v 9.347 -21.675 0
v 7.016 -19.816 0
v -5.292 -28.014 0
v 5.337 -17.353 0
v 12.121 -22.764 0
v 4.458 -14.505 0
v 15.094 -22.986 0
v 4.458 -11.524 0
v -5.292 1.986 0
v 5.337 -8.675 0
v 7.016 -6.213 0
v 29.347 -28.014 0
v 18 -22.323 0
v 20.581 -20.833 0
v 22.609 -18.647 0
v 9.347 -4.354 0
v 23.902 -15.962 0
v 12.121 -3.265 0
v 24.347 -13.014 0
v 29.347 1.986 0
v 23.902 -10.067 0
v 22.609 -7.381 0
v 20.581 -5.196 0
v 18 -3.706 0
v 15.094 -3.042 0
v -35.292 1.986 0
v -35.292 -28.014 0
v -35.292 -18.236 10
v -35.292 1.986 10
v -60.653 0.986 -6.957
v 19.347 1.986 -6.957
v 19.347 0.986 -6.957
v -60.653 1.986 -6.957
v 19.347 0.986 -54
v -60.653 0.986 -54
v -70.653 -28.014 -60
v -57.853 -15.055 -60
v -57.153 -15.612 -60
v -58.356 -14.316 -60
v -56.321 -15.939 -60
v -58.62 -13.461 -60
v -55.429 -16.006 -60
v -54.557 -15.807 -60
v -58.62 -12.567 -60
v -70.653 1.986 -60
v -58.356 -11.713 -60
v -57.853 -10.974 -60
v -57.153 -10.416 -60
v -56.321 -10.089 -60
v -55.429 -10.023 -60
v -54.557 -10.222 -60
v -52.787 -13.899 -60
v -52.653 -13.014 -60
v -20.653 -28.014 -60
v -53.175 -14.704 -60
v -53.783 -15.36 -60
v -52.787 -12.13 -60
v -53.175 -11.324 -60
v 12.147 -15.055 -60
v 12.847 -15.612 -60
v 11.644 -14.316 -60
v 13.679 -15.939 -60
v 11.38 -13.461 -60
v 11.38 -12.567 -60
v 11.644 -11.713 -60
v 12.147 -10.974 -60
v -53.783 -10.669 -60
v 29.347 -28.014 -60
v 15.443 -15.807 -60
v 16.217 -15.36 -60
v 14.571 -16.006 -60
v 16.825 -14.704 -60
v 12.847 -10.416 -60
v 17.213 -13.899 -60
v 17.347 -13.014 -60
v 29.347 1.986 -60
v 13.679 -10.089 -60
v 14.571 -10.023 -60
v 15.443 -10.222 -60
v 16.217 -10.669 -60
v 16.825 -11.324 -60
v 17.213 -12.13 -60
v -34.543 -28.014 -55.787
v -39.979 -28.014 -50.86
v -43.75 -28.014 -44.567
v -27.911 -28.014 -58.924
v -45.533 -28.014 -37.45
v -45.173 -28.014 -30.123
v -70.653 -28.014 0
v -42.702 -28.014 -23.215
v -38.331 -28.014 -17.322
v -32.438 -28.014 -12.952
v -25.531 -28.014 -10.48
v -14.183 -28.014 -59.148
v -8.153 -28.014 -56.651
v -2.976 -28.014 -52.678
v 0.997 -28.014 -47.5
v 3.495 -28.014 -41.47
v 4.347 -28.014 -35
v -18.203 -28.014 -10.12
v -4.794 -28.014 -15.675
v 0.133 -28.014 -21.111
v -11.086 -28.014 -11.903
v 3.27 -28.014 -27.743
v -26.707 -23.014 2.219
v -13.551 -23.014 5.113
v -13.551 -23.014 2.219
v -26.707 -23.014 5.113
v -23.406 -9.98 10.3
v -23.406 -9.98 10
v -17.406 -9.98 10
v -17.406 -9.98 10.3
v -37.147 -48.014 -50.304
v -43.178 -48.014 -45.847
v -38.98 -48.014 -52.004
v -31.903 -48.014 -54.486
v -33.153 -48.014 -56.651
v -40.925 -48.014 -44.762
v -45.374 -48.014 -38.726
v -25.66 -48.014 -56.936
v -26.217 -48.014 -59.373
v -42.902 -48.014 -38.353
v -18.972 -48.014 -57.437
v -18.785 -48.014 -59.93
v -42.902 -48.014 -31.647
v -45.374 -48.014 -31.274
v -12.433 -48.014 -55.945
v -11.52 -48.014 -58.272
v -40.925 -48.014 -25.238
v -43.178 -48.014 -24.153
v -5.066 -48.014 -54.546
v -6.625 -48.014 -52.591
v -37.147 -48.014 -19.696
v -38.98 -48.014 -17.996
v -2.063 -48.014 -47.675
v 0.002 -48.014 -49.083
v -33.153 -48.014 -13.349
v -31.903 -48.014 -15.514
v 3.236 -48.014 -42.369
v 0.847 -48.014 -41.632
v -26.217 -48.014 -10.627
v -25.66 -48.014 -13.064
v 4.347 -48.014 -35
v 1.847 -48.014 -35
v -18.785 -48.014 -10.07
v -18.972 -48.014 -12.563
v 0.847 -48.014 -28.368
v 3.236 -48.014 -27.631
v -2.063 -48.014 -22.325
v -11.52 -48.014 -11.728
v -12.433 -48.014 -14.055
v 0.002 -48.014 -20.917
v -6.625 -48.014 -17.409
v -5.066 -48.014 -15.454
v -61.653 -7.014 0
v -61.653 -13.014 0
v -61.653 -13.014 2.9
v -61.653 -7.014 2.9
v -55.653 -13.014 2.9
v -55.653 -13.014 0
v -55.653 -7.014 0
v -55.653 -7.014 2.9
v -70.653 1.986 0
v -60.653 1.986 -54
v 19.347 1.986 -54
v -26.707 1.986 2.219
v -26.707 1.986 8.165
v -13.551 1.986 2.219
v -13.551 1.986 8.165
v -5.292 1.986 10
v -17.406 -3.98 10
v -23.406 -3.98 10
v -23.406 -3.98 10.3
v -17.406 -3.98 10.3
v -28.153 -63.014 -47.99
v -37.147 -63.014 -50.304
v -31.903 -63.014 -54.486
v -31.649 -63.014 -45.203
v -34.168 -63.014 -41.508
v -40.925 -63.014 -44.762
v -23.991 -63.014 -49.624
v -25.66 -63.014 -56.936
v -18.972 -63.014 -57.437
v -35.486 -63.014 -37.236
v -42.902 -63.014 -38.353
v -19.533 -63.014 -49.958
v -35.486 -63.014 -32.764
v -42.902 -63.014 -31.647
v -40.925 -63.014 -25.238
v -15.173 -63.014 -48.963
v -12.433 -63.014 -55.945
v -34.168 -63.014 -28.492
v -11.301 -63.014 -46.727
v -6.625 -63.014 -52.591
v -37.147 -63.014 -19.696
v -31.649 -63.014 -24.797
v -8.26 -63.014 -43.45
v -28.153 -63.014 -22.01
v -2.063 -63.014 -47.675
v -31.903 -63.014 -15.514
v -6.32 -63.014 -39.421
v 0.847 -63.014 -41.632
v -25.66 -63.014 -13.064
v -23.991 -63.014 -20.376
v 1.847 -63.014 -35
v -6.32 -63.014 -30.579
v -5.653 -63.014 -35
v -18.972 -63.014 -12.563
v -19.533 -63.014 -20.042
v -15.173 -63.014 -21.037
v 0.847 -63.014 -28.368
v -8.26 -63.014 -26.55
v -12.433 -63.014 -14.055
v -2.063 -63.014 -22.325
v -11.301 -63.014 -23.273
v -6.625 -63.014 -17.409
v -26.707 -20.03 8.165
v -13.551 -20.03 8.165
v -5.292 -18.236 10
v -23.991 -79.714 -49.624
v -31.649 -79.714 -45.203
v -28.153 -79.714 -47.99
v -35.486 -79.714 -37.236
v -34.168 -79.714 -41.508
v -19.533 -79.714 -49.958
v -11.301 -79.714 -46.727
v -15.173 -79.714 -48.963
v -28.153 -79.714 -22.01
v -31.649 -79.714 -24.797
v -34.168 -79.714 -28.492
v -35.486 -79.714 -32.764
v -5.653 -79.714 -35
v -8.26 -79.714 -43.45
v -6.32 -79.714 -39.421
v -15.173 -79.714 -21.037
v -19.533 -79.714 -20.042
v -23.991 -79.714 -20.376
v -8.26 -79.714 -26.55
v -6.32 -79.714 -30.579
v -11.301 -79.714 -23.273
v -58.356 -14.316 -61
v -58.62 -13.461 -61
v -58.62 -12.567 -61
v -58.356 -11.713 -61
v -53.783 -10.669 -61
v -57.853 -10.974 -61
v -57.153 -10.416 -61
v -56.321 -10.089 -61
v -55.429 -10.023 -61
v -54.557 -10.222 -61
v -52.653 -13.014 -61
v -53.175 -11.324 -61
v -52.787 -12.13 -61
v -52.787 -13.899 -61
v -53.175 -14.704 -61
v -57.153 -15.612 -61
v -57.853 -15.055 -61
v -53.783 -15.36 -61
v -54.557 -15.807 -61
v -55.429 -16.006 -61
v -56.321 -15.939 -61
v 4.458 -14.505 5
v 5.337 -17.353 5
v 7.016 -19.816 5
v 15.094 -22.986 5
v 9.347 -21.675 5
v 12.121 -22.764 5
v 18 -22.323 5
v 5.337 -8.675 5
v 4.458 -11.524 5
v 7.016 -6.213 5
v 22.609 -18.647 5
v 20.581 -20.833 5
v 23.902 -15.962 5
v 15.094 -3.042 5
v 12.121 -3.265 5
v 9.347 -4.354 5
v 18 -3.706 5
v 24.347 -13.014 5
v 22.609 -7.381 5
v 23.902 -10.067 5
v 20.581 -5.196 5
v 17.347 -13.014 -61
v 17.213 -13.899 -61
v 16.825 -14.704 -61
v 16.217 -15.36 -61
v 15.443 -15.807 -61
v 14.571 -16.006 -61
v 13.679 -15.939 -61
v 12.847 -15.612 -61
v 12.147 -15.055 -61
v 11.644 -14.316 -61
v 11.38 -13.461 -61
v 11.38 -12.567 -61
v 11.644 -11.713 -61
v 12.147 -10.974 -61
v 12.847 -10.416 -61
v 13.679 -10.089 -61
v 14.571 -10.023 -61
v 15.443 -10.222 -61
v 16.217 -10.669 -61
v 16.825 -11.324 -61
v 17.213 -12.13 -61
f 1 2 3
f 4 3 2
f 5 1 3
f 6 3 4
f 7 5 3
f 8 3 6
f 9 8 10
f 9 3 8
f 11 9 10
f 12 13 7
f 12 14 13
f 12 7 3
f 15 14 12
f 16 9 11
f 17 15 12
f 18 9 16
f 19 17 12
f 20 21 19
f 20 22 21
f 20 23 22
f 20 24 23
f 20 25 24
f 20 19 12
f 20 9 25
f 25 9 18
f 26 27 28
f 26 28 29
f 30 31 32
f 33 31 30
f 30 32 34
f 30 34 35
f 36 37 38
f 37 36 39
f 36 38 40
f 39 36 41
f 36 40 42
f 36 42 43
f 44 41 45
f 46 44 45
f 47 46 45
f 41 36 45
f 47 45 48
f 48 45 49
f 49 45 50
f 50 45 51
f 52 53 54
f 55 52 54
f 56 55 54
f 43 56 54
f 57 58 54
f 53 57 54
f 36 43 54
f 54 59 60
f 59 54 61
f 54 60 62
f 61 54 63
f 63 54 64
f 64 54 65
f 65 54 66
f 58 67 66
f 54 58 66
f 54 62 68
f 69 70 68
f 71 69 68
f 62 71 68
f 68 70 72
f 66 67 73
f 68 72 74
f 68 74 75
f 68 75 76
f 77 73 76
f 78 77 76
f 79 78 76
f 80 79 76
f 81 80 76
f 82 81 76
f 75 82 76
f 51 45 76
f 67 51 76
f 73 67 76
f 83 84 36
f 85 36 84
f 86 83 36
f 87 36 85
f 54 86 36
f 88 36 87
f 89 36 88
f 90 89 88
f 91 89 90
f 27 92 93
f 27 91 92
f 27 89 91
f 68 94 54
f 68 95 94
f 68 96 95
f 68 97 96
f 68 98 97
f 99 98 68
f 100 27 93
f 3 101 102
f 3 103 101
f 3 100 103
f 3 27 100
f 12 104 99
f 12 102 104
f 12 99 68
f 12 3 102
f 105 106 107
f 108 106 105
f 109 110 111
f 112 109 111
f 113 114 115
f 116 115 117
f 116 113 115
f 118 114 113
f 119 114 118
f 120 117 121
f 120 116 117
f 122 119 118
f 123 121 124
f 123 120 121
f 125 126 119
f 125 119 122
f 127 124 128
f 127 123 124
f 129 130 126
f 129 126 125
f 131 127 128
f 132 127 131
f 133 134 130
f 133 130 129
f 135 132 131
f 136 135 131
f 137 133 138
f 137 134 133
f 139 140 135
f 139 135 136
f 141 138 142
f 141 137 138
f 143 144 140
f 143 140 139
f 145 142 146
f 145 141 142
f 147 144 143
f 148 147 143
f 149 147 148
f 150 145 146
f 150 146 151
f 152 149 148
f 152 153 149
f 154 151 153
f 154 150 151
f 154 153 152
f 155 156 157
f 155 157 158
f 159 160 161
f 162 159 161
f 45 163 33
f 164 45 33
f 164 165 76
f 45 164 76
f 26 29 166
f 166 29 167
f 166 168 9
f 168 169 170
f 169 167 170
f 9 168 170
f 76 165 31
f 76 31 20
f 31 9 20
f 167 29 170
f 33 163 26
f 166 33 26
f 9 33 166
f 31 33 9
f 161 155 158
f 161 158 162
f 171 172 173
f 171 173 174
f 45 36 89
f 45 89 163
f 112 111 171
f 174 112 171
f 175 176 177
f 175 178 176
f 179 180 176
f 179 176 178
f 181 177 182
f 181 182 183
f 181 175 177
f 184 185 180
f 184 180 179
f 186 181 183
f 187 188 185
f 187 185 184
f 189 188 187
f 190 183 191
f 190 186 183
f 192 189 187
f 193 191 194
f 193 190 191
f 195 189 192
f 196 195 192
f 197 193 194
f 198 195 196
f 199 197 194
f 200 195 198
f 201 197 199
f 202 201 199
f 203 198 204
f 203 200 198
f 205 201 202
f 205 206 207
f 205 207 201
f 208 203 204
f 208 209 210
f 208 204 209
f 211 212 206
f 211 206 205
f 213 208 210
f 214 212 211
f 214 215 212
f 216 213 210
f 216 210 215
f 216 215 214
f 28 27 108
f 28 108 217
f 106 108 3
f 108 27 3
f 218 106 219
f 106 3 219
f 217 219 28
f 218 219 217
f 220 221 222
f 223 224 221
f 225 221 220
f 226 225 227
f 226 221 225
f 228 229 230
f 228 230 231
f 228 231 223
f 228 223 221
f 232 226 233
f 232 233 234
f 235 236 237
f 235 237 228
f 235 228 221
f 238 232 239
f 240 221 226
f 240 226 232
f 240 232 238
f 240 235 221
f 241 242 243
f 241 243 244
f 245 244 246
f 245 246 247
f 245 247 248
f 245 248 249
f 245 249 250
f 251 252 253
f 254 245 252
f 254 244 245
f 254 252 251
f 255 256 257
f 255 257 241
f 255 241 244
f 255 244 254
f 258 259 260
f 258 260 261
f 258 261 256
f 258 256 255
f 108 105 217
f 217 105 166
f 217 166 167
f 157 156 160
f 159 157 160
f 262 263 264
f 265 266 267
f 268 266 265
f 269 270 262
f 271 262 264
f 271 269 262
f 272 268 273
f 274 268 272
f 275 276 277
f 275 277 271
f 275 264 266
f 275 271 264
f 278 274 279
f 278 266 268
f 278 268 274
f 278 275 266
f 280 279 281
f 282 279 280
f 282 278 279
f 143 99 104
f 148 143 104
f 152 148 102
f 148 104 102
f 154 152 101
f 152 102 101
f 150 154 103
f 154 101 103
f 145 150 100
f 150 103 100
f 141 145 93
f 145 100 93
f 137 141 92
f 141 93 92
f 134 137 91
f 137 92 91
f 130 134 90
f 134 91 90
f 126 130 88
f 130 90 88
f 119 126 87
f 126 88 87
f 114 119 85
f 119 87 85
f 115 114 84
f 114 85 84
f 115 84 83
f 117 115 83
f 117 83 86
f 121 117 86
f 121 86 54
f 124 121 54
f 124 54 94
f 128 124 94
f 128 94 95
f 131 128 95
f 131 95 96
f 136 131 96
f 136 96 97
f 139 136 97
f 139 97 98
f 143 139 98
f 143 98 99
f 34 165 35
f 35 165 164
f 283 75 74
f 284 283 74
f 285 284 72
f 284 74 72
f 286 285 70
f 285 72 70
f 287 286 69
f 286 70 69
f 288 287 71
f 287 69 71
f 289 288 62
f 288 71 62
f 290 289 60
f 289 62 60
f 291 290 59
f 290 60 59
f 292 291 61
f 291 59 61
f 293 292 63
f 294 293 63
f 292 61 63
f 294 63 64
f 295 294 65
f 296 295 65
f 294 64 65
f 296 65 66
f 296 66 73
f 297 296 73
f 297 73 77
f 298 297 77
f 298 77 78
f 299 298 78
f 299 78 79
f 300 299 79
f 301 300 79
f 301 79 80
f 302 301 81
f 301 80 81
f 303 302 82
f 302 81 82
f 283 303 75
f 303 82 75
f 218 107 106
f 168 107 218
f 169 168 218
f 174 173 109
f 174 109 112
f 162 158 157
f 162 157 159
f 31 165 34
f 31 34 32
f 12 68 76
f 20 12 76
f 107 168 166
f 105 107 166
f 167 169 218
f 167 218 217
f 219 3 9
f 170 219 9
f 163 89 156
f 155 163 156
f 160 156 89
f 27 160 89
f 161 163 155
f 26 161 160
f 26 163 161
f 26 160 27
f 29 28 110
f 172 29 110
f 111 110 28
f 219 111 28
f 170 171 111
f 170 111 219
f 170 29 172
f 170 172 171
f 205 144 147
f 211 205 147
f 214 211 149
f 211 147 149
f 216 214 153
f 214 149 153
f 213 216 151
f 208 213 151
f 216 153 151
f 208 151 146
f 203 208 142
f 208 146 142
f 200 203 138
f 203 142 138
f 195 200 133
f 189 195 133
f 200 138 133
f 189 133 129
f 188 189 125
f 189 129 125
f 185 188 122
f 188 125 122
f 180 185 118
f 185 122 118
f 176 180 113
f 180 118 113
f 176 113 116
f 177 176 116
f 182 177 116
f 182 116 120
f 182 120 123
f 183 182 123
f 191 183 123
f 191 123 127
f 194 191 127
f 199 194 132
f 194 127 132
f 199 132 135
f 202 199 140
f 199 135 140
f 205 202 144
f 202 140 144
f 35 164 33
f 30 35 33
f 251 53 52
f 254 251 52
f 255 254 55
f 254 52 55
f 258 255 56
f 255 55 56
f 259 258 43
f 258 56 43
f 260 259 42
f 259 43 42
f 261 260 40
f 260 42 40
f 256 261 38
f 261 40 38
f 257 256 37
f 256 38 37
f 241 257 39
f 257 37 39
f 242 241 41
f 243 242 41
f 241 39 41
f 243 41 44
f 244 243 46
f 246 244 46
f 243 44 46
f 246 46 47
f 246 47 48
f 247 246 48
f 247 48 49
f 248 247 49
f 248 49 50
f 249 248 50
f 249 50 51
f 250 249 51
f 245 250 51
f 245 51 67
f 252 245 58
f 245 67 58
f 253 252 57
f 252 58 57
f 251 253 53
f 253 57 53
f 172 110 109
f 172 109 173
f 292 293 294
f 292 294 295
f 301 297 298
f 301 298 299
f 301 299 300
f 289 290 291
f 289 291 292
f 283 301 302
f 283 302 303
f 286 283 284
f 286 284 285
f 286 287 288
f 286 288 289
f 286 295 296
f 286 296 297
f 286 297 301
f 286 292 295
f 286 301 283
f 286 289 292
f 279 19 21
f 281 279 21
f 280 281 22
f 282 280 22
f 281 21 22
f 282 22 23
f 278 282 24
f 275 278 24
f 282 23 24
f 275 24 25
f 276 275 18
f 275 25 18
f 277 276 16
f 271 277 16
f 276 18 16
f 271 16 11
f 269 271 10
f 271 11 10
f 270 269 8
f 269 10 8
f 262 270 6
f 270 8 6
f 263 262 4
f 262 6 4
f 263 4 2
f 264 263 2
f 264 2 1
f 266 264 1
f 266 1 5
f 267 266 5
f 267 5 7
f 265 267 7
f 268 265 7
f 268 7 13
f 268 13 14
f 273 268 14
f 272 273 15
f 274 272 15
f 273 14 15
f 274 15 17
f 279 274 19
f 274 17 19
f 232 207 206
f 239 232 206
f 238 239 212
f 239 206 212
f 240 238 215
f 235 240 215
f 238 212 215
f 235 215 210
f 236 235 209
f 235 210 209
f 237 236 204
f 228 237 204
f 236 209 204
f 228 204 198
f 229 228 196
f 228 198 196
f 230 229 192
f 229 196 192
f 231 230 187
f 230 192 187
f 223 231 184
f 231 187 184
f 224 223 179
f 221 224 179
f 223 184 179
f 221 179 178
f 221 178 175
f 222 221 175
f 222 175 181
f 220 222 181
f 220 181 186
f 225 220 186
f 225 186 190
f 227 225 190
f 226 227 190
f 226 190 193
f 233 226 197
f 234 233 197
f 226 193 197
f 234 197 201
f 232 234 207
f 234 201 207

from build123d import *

# Parameters (mm, degrees)
F0_W      = 100
F0_H      = 30
F1_DEPTH  = 60
F2_W      = 6
F2_H      = 6
F3_DEPTH  = 2.9
F4_W      = 30
F4_H      = 30
F5_DEPTH  = 10
F7_DEPTH  = 30
F8_R      = 10
F9_DEPTH  = 5
F10_R     = 25
F11_DEPTH = 20
F12_W     = 13.155363
F12_H     = 5.945411
F13_DEPTH = 25
F14_W     = 80
F14_H     = 47.04293
F15_DEPTH = 1
F16_R     = 3
F17_DEPTH = 1
F18_W     = 6
F18_H     = 6
F19_DEPTH = 0.3
F20_R     = 22.5
F21_DEPTH = 15
F22_R     = 15
F23_DEPTH = 16.7


with BuildPart() as f1:
    # F0 (on Top) → F1 (new body)
    with BuildSketch(Plane.XY):
        with Locations((-20.653479, -13.014261)):
            Rectangle(F0_W, F0_H)
    extrude(amount=-F1_DEPTH)

    # F2 (on face) → F3 (join)
    with BuildSketch(Plane.XY):
        with Locations((-58.653479, -10.014261)):
            Rectangle(F2_W, F2_H)
    extrude(amount=F3_DEPTH)

    # F4 (on face) → F5 (join)
    with BuildSketch(Plane.XY):
        with Locations((-20.292342, -13.014261)):
            Rectangle(F4_W, F4_H)
    extrude(amount=F5_DEPTH)

    # F6 (on face) → F7 (cut)
    with BuildSketch(Plane.YZ.offset(-5.292342)):
        Polygon((-18.235888, 10), (-28.014261, 10), (-28.014261, 0), align=None)
    extrude(amount=-F7_DEPTH, mode=Mode.SUBTRACT)

    # F8 (on face) → F9 (join)
    with BuildSketch(Plane.XY):
        with Locations((14.346521, -13.014261)):
            Circle(F8_R)
    extrude(amount=F9_DEPTH)

    # F10 (on face) → F11 (join)
    with BuildSketch(Plane.XZ.offset(28.014261)):
        with Locations((-20.653479, -35)):
            Circle(F10_R)
    extrude(amount=F11_DEPTH)

    # F12 (on face) → F13 (cut)
    with BuildSketch(Plane(origin=(0, 1.985739, 0), x_dir=(-1, 0, 0), z_dir=(0, 1, 0))):
        with Locations((20.129042, 5.192092)):
            Rectangle(F12_W, F12_H)
    extrude(amount=-F13_DEPTH, mode=Mode.SUBTRACT)

    # F14 (on face) → F15 (cut)
    with BuildSketch(Plane(origin=(0, 1.985739, 0), x_dir=(-1, 0, 0), z_dir=(0, 1, 0))):
        with Locations((20.653479, -30.478535)):
            Rectangle(F14_W, F14_H)
    extrude(amount=-F15_DEPTH, mode=Mode.SUBTRACT)

    # F16 (on face) → F17 (join)
    with BuildSketch(Plane(origin=(0, 0, -60), x_dir=(1, 0, 0), z_dir=(0, 0, -1))):
        with Locations((-55.653479, 13.014261)):
            Circle(F16_R)
        with Locations((14.346521, 13.014261)):
            Circle(F16_R)
    extrude(amount=F17_DEPTH)

    # F18 (on face) → F19 (join)
    with BuildSketch(Plane.XY.offset(10)):
        with Locations((-20.406025, -6.980354)):
            Rectangle(F18_W, F18_H)
    extrude(amount=F19_DEPTH)

    # F20 (on face) → F21 (join)
    with BuildSketch(Plane.XZ.offset(48.014261)):
        with Locations((-20.653479, -35)):
            Circle(F20_R)
    extrude(amount=F21_DEPTH)

    # F22 (on face) → F23 (join)
    with BuildSketch(Plane.XZ.offset(63.014261)):
        with Locations((-20.653479, -35)):
            Circle(F22_R)
    extrude(amount=F23_DEPTH)


solid = f1.part
